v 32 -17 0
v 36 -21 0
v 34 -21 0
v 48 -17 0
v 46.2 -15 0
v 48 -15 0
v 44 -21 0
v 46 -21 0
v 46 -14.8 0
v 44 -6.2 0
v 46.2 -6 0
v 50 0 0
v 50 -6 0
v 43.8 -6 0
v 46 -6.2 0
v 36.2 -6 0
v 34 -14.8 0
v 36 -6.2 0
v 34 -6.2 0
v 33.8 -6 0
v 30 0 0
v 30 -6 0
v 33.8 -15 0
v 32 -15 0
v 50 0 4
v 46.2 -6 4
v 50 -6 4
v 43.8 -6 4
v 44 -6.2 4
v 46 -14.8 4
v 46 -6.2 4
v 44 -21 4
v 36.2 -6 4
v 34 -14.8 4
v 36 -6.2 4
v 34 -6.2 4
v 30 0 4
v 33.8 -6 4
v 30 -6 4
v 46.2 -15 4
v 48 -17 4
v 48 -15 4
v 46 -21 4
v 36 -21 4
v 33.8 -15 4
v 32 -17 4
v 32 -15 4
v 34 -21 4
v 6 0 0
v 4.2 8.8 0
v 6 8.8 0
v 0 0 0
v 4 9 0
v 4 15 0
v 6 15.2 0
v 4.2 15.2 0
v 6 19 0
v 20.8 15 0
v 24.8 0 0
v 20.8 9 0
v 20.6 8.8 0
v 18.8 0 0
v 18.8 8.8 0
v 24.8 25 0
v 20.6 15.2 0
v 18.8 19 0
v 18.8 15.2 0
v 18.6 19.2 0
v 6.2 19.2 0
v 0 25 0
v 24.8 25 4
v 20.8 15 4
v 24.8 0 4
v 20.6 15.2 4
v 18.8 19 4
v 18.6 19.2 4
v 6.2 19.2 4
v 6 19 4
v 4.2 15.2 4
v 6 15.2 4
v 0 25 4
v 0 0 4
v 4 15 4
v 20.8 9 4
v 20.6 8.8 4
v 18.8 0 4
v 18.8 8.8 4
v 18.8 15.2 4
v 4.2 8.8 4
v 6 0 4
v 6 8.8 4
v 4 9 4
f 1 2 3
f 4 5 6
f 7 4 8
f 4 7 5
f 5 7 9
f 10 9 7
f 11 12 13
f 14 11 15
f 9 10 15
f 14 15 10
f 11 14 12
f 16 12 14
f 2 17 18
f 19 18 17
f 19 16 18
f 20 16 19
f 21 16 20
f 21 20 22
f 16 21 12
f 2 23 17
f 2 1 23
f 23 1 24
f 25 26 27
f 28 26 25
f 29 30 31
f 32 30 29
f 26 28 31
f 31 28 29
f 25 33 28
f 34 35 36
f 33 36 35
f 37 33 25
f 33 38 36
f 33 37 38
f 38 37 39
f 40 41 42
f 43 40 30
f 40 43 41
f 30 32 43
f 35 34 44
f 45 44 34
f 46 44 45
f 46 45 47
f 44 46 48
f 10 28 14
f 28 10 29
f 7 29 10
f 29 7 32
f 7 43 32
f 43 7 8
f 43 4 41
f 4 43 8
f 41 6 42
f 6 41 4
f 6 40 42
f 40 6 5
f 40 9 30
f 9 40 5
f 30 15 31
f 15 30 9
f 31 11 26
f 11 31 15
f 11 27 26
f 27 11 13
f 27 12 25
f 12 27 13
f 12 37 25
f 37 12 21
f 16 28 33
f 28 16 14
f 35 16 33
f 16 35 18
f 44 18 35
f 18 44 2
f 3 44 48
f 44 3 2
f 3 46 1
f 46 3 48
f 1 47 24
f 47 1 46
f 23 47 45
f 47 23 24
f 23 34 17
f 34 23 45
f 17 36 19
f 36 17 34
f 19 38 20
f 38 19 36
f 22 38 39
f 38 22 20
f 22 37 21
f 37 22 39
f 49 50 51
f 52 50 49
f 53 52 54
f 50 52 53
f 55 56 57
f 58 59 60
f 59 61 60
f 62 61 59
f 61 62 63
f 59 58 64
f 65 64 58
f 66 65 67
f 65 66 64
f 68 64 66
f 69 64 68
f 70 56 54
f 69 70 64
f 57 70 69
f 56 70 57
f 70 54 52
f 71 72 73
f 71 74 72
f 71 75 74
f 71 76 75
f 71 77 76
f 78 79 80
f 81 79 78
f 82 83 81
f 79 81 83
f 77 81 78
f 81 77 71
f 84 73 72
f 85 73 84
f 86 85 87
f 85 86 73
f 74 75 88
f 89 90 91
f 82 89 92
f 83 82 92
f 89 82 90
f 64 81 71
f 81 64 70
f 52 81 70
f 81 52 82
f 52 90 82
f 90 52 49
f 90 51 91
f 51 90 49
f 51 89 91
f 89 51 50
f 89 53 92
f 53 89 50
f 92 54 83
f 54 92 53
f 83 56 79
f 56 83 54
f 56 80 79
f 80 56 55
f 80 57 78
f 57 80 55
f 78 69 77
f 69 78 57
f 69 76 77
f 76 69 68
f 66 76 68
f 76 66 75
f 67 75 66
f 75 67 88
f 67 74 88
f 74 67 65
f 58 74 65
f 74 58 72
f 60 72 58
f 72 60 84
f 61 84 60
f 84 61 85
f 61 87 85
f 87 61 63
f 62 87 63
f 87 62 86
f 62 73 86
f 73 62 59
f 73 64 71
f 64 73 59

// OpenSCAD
//--------
$fa = 1;
$fs = 0.4;

// NOTE: a suffix of `x` indicates that the variable has a subscript in
// `geometry.png`
L0_temp = 15;
L2_temp = 8;
b = 4;
bx = [2, 4, 6, L2_temp - 4];
hx = [2, 4, 2, 4, 4];
h = hx[2];
Lx = [L0_temp, L0_temp - (bx[0] + bx[1]), L2_temp];
tol = /*1.0;*/ /*0.8;*/ 0.4;
offs = 0.20;

module snap_fit_half(){
    linear_extrude(b){
        offset(r=-offs) offset(delta=offs)
        union(){
            square([bx[2], hx[1] + hx[2] + hx[3]]);
            translate([bx[2], hx[1], 0])
                square([Lx[0], hx[2]]);
            translate([Lx[1] + bx[0] + bx[2], hx[1] + hx[2], 0])
                polygon([
                    [0, 0],
                    [bx[1], 0],
                    [0, hx[0]],
                ]);
            translate([Lx[1] + bx[2], hx[1] + hx[2], 0])
                square([bx[0], hx[0]]);
        }
    }
}

//translate([0, -(hx[1] + hx[2] + hx[3]), 0])

module snap_fit(){
    union(){
        snap_fit_half();
        translate([0, 0, b])
            rotate([180])
                snap_fit_half();
    }
}
translate([40, 0, 0]){
    rotate([0, 0, -90])
    snap_fit();
}


//spread_sz_x = 2.0 * (hx[1] + hx[2]) + (tol /* / 2.0*/);
//module sf_hole_part(){
//    linear_extrude(b){
//        difference(){
//            square([
//                2.0 * (hx[0] + hx[4]) + spread_sz_x,
//                Lx[1] + bx[0] + bx[1] + Lx[2], 
//            ]);
//            union(){
//                translate([hx[4], Lx[1] - (tol / 2.0), 0])
//                    square([
//                        2.0 * hx[0] + spread_sz_x,
//                        bx[0] + bx[1] + tol
//                    ]);
//                translate([hx[0] + hx[4], 0, 0])
//                    square([
//                        spread_sz_x,
//                        Lx[1] + bx[0] + bx[1] + bx[3],
//                    ]);
//            }
//        }
//    }
//}

spread_sz_x_half = hx[1] + hx[2] + tol /*/ 2.0*/;

module sf_hole_part_half_noext(){
    //linear_extrude(b){
        difference(){
            square([
                hx[0] + hx[4] + spread_sz_x_half,
                Lx[1] + bx[0] + bx[2] + Lx[2],
            ]);
            union(){
                translate([hx[0] + hx[4], 0, 0])
                    square([
                        spread_sz_x_half,
                        Lx[1] + bx[0] + bx[1] + bx[3] + tol / 2.0
                    ]);
                translate([
                    hx[4],
                    Lx[1] - tol / 2.0,
                    0
                ])
                    square([
                        hx[0],
                        bx[0] + bx[1] + tol,
                    ]);
            }
        }
    //}
}
module sf_hole_part(){
    //offset(r=offs) offset(delta=-offs)
    linear_extrude(b){
        offset(r=-offs) offset(delta=offs)
        union(){
            sf_hole_part_half_noext();
            translate([2 * (hx[0] + hx[4] + spread_sz_x_half), 0, 0])
                mirror([180, 0, 0])
                    sf_hole_part_half_noext();
        }
    }
}

//translate([20, 0, 0])
    //rotate([0, 0, -180])
        sf_hole_part();
